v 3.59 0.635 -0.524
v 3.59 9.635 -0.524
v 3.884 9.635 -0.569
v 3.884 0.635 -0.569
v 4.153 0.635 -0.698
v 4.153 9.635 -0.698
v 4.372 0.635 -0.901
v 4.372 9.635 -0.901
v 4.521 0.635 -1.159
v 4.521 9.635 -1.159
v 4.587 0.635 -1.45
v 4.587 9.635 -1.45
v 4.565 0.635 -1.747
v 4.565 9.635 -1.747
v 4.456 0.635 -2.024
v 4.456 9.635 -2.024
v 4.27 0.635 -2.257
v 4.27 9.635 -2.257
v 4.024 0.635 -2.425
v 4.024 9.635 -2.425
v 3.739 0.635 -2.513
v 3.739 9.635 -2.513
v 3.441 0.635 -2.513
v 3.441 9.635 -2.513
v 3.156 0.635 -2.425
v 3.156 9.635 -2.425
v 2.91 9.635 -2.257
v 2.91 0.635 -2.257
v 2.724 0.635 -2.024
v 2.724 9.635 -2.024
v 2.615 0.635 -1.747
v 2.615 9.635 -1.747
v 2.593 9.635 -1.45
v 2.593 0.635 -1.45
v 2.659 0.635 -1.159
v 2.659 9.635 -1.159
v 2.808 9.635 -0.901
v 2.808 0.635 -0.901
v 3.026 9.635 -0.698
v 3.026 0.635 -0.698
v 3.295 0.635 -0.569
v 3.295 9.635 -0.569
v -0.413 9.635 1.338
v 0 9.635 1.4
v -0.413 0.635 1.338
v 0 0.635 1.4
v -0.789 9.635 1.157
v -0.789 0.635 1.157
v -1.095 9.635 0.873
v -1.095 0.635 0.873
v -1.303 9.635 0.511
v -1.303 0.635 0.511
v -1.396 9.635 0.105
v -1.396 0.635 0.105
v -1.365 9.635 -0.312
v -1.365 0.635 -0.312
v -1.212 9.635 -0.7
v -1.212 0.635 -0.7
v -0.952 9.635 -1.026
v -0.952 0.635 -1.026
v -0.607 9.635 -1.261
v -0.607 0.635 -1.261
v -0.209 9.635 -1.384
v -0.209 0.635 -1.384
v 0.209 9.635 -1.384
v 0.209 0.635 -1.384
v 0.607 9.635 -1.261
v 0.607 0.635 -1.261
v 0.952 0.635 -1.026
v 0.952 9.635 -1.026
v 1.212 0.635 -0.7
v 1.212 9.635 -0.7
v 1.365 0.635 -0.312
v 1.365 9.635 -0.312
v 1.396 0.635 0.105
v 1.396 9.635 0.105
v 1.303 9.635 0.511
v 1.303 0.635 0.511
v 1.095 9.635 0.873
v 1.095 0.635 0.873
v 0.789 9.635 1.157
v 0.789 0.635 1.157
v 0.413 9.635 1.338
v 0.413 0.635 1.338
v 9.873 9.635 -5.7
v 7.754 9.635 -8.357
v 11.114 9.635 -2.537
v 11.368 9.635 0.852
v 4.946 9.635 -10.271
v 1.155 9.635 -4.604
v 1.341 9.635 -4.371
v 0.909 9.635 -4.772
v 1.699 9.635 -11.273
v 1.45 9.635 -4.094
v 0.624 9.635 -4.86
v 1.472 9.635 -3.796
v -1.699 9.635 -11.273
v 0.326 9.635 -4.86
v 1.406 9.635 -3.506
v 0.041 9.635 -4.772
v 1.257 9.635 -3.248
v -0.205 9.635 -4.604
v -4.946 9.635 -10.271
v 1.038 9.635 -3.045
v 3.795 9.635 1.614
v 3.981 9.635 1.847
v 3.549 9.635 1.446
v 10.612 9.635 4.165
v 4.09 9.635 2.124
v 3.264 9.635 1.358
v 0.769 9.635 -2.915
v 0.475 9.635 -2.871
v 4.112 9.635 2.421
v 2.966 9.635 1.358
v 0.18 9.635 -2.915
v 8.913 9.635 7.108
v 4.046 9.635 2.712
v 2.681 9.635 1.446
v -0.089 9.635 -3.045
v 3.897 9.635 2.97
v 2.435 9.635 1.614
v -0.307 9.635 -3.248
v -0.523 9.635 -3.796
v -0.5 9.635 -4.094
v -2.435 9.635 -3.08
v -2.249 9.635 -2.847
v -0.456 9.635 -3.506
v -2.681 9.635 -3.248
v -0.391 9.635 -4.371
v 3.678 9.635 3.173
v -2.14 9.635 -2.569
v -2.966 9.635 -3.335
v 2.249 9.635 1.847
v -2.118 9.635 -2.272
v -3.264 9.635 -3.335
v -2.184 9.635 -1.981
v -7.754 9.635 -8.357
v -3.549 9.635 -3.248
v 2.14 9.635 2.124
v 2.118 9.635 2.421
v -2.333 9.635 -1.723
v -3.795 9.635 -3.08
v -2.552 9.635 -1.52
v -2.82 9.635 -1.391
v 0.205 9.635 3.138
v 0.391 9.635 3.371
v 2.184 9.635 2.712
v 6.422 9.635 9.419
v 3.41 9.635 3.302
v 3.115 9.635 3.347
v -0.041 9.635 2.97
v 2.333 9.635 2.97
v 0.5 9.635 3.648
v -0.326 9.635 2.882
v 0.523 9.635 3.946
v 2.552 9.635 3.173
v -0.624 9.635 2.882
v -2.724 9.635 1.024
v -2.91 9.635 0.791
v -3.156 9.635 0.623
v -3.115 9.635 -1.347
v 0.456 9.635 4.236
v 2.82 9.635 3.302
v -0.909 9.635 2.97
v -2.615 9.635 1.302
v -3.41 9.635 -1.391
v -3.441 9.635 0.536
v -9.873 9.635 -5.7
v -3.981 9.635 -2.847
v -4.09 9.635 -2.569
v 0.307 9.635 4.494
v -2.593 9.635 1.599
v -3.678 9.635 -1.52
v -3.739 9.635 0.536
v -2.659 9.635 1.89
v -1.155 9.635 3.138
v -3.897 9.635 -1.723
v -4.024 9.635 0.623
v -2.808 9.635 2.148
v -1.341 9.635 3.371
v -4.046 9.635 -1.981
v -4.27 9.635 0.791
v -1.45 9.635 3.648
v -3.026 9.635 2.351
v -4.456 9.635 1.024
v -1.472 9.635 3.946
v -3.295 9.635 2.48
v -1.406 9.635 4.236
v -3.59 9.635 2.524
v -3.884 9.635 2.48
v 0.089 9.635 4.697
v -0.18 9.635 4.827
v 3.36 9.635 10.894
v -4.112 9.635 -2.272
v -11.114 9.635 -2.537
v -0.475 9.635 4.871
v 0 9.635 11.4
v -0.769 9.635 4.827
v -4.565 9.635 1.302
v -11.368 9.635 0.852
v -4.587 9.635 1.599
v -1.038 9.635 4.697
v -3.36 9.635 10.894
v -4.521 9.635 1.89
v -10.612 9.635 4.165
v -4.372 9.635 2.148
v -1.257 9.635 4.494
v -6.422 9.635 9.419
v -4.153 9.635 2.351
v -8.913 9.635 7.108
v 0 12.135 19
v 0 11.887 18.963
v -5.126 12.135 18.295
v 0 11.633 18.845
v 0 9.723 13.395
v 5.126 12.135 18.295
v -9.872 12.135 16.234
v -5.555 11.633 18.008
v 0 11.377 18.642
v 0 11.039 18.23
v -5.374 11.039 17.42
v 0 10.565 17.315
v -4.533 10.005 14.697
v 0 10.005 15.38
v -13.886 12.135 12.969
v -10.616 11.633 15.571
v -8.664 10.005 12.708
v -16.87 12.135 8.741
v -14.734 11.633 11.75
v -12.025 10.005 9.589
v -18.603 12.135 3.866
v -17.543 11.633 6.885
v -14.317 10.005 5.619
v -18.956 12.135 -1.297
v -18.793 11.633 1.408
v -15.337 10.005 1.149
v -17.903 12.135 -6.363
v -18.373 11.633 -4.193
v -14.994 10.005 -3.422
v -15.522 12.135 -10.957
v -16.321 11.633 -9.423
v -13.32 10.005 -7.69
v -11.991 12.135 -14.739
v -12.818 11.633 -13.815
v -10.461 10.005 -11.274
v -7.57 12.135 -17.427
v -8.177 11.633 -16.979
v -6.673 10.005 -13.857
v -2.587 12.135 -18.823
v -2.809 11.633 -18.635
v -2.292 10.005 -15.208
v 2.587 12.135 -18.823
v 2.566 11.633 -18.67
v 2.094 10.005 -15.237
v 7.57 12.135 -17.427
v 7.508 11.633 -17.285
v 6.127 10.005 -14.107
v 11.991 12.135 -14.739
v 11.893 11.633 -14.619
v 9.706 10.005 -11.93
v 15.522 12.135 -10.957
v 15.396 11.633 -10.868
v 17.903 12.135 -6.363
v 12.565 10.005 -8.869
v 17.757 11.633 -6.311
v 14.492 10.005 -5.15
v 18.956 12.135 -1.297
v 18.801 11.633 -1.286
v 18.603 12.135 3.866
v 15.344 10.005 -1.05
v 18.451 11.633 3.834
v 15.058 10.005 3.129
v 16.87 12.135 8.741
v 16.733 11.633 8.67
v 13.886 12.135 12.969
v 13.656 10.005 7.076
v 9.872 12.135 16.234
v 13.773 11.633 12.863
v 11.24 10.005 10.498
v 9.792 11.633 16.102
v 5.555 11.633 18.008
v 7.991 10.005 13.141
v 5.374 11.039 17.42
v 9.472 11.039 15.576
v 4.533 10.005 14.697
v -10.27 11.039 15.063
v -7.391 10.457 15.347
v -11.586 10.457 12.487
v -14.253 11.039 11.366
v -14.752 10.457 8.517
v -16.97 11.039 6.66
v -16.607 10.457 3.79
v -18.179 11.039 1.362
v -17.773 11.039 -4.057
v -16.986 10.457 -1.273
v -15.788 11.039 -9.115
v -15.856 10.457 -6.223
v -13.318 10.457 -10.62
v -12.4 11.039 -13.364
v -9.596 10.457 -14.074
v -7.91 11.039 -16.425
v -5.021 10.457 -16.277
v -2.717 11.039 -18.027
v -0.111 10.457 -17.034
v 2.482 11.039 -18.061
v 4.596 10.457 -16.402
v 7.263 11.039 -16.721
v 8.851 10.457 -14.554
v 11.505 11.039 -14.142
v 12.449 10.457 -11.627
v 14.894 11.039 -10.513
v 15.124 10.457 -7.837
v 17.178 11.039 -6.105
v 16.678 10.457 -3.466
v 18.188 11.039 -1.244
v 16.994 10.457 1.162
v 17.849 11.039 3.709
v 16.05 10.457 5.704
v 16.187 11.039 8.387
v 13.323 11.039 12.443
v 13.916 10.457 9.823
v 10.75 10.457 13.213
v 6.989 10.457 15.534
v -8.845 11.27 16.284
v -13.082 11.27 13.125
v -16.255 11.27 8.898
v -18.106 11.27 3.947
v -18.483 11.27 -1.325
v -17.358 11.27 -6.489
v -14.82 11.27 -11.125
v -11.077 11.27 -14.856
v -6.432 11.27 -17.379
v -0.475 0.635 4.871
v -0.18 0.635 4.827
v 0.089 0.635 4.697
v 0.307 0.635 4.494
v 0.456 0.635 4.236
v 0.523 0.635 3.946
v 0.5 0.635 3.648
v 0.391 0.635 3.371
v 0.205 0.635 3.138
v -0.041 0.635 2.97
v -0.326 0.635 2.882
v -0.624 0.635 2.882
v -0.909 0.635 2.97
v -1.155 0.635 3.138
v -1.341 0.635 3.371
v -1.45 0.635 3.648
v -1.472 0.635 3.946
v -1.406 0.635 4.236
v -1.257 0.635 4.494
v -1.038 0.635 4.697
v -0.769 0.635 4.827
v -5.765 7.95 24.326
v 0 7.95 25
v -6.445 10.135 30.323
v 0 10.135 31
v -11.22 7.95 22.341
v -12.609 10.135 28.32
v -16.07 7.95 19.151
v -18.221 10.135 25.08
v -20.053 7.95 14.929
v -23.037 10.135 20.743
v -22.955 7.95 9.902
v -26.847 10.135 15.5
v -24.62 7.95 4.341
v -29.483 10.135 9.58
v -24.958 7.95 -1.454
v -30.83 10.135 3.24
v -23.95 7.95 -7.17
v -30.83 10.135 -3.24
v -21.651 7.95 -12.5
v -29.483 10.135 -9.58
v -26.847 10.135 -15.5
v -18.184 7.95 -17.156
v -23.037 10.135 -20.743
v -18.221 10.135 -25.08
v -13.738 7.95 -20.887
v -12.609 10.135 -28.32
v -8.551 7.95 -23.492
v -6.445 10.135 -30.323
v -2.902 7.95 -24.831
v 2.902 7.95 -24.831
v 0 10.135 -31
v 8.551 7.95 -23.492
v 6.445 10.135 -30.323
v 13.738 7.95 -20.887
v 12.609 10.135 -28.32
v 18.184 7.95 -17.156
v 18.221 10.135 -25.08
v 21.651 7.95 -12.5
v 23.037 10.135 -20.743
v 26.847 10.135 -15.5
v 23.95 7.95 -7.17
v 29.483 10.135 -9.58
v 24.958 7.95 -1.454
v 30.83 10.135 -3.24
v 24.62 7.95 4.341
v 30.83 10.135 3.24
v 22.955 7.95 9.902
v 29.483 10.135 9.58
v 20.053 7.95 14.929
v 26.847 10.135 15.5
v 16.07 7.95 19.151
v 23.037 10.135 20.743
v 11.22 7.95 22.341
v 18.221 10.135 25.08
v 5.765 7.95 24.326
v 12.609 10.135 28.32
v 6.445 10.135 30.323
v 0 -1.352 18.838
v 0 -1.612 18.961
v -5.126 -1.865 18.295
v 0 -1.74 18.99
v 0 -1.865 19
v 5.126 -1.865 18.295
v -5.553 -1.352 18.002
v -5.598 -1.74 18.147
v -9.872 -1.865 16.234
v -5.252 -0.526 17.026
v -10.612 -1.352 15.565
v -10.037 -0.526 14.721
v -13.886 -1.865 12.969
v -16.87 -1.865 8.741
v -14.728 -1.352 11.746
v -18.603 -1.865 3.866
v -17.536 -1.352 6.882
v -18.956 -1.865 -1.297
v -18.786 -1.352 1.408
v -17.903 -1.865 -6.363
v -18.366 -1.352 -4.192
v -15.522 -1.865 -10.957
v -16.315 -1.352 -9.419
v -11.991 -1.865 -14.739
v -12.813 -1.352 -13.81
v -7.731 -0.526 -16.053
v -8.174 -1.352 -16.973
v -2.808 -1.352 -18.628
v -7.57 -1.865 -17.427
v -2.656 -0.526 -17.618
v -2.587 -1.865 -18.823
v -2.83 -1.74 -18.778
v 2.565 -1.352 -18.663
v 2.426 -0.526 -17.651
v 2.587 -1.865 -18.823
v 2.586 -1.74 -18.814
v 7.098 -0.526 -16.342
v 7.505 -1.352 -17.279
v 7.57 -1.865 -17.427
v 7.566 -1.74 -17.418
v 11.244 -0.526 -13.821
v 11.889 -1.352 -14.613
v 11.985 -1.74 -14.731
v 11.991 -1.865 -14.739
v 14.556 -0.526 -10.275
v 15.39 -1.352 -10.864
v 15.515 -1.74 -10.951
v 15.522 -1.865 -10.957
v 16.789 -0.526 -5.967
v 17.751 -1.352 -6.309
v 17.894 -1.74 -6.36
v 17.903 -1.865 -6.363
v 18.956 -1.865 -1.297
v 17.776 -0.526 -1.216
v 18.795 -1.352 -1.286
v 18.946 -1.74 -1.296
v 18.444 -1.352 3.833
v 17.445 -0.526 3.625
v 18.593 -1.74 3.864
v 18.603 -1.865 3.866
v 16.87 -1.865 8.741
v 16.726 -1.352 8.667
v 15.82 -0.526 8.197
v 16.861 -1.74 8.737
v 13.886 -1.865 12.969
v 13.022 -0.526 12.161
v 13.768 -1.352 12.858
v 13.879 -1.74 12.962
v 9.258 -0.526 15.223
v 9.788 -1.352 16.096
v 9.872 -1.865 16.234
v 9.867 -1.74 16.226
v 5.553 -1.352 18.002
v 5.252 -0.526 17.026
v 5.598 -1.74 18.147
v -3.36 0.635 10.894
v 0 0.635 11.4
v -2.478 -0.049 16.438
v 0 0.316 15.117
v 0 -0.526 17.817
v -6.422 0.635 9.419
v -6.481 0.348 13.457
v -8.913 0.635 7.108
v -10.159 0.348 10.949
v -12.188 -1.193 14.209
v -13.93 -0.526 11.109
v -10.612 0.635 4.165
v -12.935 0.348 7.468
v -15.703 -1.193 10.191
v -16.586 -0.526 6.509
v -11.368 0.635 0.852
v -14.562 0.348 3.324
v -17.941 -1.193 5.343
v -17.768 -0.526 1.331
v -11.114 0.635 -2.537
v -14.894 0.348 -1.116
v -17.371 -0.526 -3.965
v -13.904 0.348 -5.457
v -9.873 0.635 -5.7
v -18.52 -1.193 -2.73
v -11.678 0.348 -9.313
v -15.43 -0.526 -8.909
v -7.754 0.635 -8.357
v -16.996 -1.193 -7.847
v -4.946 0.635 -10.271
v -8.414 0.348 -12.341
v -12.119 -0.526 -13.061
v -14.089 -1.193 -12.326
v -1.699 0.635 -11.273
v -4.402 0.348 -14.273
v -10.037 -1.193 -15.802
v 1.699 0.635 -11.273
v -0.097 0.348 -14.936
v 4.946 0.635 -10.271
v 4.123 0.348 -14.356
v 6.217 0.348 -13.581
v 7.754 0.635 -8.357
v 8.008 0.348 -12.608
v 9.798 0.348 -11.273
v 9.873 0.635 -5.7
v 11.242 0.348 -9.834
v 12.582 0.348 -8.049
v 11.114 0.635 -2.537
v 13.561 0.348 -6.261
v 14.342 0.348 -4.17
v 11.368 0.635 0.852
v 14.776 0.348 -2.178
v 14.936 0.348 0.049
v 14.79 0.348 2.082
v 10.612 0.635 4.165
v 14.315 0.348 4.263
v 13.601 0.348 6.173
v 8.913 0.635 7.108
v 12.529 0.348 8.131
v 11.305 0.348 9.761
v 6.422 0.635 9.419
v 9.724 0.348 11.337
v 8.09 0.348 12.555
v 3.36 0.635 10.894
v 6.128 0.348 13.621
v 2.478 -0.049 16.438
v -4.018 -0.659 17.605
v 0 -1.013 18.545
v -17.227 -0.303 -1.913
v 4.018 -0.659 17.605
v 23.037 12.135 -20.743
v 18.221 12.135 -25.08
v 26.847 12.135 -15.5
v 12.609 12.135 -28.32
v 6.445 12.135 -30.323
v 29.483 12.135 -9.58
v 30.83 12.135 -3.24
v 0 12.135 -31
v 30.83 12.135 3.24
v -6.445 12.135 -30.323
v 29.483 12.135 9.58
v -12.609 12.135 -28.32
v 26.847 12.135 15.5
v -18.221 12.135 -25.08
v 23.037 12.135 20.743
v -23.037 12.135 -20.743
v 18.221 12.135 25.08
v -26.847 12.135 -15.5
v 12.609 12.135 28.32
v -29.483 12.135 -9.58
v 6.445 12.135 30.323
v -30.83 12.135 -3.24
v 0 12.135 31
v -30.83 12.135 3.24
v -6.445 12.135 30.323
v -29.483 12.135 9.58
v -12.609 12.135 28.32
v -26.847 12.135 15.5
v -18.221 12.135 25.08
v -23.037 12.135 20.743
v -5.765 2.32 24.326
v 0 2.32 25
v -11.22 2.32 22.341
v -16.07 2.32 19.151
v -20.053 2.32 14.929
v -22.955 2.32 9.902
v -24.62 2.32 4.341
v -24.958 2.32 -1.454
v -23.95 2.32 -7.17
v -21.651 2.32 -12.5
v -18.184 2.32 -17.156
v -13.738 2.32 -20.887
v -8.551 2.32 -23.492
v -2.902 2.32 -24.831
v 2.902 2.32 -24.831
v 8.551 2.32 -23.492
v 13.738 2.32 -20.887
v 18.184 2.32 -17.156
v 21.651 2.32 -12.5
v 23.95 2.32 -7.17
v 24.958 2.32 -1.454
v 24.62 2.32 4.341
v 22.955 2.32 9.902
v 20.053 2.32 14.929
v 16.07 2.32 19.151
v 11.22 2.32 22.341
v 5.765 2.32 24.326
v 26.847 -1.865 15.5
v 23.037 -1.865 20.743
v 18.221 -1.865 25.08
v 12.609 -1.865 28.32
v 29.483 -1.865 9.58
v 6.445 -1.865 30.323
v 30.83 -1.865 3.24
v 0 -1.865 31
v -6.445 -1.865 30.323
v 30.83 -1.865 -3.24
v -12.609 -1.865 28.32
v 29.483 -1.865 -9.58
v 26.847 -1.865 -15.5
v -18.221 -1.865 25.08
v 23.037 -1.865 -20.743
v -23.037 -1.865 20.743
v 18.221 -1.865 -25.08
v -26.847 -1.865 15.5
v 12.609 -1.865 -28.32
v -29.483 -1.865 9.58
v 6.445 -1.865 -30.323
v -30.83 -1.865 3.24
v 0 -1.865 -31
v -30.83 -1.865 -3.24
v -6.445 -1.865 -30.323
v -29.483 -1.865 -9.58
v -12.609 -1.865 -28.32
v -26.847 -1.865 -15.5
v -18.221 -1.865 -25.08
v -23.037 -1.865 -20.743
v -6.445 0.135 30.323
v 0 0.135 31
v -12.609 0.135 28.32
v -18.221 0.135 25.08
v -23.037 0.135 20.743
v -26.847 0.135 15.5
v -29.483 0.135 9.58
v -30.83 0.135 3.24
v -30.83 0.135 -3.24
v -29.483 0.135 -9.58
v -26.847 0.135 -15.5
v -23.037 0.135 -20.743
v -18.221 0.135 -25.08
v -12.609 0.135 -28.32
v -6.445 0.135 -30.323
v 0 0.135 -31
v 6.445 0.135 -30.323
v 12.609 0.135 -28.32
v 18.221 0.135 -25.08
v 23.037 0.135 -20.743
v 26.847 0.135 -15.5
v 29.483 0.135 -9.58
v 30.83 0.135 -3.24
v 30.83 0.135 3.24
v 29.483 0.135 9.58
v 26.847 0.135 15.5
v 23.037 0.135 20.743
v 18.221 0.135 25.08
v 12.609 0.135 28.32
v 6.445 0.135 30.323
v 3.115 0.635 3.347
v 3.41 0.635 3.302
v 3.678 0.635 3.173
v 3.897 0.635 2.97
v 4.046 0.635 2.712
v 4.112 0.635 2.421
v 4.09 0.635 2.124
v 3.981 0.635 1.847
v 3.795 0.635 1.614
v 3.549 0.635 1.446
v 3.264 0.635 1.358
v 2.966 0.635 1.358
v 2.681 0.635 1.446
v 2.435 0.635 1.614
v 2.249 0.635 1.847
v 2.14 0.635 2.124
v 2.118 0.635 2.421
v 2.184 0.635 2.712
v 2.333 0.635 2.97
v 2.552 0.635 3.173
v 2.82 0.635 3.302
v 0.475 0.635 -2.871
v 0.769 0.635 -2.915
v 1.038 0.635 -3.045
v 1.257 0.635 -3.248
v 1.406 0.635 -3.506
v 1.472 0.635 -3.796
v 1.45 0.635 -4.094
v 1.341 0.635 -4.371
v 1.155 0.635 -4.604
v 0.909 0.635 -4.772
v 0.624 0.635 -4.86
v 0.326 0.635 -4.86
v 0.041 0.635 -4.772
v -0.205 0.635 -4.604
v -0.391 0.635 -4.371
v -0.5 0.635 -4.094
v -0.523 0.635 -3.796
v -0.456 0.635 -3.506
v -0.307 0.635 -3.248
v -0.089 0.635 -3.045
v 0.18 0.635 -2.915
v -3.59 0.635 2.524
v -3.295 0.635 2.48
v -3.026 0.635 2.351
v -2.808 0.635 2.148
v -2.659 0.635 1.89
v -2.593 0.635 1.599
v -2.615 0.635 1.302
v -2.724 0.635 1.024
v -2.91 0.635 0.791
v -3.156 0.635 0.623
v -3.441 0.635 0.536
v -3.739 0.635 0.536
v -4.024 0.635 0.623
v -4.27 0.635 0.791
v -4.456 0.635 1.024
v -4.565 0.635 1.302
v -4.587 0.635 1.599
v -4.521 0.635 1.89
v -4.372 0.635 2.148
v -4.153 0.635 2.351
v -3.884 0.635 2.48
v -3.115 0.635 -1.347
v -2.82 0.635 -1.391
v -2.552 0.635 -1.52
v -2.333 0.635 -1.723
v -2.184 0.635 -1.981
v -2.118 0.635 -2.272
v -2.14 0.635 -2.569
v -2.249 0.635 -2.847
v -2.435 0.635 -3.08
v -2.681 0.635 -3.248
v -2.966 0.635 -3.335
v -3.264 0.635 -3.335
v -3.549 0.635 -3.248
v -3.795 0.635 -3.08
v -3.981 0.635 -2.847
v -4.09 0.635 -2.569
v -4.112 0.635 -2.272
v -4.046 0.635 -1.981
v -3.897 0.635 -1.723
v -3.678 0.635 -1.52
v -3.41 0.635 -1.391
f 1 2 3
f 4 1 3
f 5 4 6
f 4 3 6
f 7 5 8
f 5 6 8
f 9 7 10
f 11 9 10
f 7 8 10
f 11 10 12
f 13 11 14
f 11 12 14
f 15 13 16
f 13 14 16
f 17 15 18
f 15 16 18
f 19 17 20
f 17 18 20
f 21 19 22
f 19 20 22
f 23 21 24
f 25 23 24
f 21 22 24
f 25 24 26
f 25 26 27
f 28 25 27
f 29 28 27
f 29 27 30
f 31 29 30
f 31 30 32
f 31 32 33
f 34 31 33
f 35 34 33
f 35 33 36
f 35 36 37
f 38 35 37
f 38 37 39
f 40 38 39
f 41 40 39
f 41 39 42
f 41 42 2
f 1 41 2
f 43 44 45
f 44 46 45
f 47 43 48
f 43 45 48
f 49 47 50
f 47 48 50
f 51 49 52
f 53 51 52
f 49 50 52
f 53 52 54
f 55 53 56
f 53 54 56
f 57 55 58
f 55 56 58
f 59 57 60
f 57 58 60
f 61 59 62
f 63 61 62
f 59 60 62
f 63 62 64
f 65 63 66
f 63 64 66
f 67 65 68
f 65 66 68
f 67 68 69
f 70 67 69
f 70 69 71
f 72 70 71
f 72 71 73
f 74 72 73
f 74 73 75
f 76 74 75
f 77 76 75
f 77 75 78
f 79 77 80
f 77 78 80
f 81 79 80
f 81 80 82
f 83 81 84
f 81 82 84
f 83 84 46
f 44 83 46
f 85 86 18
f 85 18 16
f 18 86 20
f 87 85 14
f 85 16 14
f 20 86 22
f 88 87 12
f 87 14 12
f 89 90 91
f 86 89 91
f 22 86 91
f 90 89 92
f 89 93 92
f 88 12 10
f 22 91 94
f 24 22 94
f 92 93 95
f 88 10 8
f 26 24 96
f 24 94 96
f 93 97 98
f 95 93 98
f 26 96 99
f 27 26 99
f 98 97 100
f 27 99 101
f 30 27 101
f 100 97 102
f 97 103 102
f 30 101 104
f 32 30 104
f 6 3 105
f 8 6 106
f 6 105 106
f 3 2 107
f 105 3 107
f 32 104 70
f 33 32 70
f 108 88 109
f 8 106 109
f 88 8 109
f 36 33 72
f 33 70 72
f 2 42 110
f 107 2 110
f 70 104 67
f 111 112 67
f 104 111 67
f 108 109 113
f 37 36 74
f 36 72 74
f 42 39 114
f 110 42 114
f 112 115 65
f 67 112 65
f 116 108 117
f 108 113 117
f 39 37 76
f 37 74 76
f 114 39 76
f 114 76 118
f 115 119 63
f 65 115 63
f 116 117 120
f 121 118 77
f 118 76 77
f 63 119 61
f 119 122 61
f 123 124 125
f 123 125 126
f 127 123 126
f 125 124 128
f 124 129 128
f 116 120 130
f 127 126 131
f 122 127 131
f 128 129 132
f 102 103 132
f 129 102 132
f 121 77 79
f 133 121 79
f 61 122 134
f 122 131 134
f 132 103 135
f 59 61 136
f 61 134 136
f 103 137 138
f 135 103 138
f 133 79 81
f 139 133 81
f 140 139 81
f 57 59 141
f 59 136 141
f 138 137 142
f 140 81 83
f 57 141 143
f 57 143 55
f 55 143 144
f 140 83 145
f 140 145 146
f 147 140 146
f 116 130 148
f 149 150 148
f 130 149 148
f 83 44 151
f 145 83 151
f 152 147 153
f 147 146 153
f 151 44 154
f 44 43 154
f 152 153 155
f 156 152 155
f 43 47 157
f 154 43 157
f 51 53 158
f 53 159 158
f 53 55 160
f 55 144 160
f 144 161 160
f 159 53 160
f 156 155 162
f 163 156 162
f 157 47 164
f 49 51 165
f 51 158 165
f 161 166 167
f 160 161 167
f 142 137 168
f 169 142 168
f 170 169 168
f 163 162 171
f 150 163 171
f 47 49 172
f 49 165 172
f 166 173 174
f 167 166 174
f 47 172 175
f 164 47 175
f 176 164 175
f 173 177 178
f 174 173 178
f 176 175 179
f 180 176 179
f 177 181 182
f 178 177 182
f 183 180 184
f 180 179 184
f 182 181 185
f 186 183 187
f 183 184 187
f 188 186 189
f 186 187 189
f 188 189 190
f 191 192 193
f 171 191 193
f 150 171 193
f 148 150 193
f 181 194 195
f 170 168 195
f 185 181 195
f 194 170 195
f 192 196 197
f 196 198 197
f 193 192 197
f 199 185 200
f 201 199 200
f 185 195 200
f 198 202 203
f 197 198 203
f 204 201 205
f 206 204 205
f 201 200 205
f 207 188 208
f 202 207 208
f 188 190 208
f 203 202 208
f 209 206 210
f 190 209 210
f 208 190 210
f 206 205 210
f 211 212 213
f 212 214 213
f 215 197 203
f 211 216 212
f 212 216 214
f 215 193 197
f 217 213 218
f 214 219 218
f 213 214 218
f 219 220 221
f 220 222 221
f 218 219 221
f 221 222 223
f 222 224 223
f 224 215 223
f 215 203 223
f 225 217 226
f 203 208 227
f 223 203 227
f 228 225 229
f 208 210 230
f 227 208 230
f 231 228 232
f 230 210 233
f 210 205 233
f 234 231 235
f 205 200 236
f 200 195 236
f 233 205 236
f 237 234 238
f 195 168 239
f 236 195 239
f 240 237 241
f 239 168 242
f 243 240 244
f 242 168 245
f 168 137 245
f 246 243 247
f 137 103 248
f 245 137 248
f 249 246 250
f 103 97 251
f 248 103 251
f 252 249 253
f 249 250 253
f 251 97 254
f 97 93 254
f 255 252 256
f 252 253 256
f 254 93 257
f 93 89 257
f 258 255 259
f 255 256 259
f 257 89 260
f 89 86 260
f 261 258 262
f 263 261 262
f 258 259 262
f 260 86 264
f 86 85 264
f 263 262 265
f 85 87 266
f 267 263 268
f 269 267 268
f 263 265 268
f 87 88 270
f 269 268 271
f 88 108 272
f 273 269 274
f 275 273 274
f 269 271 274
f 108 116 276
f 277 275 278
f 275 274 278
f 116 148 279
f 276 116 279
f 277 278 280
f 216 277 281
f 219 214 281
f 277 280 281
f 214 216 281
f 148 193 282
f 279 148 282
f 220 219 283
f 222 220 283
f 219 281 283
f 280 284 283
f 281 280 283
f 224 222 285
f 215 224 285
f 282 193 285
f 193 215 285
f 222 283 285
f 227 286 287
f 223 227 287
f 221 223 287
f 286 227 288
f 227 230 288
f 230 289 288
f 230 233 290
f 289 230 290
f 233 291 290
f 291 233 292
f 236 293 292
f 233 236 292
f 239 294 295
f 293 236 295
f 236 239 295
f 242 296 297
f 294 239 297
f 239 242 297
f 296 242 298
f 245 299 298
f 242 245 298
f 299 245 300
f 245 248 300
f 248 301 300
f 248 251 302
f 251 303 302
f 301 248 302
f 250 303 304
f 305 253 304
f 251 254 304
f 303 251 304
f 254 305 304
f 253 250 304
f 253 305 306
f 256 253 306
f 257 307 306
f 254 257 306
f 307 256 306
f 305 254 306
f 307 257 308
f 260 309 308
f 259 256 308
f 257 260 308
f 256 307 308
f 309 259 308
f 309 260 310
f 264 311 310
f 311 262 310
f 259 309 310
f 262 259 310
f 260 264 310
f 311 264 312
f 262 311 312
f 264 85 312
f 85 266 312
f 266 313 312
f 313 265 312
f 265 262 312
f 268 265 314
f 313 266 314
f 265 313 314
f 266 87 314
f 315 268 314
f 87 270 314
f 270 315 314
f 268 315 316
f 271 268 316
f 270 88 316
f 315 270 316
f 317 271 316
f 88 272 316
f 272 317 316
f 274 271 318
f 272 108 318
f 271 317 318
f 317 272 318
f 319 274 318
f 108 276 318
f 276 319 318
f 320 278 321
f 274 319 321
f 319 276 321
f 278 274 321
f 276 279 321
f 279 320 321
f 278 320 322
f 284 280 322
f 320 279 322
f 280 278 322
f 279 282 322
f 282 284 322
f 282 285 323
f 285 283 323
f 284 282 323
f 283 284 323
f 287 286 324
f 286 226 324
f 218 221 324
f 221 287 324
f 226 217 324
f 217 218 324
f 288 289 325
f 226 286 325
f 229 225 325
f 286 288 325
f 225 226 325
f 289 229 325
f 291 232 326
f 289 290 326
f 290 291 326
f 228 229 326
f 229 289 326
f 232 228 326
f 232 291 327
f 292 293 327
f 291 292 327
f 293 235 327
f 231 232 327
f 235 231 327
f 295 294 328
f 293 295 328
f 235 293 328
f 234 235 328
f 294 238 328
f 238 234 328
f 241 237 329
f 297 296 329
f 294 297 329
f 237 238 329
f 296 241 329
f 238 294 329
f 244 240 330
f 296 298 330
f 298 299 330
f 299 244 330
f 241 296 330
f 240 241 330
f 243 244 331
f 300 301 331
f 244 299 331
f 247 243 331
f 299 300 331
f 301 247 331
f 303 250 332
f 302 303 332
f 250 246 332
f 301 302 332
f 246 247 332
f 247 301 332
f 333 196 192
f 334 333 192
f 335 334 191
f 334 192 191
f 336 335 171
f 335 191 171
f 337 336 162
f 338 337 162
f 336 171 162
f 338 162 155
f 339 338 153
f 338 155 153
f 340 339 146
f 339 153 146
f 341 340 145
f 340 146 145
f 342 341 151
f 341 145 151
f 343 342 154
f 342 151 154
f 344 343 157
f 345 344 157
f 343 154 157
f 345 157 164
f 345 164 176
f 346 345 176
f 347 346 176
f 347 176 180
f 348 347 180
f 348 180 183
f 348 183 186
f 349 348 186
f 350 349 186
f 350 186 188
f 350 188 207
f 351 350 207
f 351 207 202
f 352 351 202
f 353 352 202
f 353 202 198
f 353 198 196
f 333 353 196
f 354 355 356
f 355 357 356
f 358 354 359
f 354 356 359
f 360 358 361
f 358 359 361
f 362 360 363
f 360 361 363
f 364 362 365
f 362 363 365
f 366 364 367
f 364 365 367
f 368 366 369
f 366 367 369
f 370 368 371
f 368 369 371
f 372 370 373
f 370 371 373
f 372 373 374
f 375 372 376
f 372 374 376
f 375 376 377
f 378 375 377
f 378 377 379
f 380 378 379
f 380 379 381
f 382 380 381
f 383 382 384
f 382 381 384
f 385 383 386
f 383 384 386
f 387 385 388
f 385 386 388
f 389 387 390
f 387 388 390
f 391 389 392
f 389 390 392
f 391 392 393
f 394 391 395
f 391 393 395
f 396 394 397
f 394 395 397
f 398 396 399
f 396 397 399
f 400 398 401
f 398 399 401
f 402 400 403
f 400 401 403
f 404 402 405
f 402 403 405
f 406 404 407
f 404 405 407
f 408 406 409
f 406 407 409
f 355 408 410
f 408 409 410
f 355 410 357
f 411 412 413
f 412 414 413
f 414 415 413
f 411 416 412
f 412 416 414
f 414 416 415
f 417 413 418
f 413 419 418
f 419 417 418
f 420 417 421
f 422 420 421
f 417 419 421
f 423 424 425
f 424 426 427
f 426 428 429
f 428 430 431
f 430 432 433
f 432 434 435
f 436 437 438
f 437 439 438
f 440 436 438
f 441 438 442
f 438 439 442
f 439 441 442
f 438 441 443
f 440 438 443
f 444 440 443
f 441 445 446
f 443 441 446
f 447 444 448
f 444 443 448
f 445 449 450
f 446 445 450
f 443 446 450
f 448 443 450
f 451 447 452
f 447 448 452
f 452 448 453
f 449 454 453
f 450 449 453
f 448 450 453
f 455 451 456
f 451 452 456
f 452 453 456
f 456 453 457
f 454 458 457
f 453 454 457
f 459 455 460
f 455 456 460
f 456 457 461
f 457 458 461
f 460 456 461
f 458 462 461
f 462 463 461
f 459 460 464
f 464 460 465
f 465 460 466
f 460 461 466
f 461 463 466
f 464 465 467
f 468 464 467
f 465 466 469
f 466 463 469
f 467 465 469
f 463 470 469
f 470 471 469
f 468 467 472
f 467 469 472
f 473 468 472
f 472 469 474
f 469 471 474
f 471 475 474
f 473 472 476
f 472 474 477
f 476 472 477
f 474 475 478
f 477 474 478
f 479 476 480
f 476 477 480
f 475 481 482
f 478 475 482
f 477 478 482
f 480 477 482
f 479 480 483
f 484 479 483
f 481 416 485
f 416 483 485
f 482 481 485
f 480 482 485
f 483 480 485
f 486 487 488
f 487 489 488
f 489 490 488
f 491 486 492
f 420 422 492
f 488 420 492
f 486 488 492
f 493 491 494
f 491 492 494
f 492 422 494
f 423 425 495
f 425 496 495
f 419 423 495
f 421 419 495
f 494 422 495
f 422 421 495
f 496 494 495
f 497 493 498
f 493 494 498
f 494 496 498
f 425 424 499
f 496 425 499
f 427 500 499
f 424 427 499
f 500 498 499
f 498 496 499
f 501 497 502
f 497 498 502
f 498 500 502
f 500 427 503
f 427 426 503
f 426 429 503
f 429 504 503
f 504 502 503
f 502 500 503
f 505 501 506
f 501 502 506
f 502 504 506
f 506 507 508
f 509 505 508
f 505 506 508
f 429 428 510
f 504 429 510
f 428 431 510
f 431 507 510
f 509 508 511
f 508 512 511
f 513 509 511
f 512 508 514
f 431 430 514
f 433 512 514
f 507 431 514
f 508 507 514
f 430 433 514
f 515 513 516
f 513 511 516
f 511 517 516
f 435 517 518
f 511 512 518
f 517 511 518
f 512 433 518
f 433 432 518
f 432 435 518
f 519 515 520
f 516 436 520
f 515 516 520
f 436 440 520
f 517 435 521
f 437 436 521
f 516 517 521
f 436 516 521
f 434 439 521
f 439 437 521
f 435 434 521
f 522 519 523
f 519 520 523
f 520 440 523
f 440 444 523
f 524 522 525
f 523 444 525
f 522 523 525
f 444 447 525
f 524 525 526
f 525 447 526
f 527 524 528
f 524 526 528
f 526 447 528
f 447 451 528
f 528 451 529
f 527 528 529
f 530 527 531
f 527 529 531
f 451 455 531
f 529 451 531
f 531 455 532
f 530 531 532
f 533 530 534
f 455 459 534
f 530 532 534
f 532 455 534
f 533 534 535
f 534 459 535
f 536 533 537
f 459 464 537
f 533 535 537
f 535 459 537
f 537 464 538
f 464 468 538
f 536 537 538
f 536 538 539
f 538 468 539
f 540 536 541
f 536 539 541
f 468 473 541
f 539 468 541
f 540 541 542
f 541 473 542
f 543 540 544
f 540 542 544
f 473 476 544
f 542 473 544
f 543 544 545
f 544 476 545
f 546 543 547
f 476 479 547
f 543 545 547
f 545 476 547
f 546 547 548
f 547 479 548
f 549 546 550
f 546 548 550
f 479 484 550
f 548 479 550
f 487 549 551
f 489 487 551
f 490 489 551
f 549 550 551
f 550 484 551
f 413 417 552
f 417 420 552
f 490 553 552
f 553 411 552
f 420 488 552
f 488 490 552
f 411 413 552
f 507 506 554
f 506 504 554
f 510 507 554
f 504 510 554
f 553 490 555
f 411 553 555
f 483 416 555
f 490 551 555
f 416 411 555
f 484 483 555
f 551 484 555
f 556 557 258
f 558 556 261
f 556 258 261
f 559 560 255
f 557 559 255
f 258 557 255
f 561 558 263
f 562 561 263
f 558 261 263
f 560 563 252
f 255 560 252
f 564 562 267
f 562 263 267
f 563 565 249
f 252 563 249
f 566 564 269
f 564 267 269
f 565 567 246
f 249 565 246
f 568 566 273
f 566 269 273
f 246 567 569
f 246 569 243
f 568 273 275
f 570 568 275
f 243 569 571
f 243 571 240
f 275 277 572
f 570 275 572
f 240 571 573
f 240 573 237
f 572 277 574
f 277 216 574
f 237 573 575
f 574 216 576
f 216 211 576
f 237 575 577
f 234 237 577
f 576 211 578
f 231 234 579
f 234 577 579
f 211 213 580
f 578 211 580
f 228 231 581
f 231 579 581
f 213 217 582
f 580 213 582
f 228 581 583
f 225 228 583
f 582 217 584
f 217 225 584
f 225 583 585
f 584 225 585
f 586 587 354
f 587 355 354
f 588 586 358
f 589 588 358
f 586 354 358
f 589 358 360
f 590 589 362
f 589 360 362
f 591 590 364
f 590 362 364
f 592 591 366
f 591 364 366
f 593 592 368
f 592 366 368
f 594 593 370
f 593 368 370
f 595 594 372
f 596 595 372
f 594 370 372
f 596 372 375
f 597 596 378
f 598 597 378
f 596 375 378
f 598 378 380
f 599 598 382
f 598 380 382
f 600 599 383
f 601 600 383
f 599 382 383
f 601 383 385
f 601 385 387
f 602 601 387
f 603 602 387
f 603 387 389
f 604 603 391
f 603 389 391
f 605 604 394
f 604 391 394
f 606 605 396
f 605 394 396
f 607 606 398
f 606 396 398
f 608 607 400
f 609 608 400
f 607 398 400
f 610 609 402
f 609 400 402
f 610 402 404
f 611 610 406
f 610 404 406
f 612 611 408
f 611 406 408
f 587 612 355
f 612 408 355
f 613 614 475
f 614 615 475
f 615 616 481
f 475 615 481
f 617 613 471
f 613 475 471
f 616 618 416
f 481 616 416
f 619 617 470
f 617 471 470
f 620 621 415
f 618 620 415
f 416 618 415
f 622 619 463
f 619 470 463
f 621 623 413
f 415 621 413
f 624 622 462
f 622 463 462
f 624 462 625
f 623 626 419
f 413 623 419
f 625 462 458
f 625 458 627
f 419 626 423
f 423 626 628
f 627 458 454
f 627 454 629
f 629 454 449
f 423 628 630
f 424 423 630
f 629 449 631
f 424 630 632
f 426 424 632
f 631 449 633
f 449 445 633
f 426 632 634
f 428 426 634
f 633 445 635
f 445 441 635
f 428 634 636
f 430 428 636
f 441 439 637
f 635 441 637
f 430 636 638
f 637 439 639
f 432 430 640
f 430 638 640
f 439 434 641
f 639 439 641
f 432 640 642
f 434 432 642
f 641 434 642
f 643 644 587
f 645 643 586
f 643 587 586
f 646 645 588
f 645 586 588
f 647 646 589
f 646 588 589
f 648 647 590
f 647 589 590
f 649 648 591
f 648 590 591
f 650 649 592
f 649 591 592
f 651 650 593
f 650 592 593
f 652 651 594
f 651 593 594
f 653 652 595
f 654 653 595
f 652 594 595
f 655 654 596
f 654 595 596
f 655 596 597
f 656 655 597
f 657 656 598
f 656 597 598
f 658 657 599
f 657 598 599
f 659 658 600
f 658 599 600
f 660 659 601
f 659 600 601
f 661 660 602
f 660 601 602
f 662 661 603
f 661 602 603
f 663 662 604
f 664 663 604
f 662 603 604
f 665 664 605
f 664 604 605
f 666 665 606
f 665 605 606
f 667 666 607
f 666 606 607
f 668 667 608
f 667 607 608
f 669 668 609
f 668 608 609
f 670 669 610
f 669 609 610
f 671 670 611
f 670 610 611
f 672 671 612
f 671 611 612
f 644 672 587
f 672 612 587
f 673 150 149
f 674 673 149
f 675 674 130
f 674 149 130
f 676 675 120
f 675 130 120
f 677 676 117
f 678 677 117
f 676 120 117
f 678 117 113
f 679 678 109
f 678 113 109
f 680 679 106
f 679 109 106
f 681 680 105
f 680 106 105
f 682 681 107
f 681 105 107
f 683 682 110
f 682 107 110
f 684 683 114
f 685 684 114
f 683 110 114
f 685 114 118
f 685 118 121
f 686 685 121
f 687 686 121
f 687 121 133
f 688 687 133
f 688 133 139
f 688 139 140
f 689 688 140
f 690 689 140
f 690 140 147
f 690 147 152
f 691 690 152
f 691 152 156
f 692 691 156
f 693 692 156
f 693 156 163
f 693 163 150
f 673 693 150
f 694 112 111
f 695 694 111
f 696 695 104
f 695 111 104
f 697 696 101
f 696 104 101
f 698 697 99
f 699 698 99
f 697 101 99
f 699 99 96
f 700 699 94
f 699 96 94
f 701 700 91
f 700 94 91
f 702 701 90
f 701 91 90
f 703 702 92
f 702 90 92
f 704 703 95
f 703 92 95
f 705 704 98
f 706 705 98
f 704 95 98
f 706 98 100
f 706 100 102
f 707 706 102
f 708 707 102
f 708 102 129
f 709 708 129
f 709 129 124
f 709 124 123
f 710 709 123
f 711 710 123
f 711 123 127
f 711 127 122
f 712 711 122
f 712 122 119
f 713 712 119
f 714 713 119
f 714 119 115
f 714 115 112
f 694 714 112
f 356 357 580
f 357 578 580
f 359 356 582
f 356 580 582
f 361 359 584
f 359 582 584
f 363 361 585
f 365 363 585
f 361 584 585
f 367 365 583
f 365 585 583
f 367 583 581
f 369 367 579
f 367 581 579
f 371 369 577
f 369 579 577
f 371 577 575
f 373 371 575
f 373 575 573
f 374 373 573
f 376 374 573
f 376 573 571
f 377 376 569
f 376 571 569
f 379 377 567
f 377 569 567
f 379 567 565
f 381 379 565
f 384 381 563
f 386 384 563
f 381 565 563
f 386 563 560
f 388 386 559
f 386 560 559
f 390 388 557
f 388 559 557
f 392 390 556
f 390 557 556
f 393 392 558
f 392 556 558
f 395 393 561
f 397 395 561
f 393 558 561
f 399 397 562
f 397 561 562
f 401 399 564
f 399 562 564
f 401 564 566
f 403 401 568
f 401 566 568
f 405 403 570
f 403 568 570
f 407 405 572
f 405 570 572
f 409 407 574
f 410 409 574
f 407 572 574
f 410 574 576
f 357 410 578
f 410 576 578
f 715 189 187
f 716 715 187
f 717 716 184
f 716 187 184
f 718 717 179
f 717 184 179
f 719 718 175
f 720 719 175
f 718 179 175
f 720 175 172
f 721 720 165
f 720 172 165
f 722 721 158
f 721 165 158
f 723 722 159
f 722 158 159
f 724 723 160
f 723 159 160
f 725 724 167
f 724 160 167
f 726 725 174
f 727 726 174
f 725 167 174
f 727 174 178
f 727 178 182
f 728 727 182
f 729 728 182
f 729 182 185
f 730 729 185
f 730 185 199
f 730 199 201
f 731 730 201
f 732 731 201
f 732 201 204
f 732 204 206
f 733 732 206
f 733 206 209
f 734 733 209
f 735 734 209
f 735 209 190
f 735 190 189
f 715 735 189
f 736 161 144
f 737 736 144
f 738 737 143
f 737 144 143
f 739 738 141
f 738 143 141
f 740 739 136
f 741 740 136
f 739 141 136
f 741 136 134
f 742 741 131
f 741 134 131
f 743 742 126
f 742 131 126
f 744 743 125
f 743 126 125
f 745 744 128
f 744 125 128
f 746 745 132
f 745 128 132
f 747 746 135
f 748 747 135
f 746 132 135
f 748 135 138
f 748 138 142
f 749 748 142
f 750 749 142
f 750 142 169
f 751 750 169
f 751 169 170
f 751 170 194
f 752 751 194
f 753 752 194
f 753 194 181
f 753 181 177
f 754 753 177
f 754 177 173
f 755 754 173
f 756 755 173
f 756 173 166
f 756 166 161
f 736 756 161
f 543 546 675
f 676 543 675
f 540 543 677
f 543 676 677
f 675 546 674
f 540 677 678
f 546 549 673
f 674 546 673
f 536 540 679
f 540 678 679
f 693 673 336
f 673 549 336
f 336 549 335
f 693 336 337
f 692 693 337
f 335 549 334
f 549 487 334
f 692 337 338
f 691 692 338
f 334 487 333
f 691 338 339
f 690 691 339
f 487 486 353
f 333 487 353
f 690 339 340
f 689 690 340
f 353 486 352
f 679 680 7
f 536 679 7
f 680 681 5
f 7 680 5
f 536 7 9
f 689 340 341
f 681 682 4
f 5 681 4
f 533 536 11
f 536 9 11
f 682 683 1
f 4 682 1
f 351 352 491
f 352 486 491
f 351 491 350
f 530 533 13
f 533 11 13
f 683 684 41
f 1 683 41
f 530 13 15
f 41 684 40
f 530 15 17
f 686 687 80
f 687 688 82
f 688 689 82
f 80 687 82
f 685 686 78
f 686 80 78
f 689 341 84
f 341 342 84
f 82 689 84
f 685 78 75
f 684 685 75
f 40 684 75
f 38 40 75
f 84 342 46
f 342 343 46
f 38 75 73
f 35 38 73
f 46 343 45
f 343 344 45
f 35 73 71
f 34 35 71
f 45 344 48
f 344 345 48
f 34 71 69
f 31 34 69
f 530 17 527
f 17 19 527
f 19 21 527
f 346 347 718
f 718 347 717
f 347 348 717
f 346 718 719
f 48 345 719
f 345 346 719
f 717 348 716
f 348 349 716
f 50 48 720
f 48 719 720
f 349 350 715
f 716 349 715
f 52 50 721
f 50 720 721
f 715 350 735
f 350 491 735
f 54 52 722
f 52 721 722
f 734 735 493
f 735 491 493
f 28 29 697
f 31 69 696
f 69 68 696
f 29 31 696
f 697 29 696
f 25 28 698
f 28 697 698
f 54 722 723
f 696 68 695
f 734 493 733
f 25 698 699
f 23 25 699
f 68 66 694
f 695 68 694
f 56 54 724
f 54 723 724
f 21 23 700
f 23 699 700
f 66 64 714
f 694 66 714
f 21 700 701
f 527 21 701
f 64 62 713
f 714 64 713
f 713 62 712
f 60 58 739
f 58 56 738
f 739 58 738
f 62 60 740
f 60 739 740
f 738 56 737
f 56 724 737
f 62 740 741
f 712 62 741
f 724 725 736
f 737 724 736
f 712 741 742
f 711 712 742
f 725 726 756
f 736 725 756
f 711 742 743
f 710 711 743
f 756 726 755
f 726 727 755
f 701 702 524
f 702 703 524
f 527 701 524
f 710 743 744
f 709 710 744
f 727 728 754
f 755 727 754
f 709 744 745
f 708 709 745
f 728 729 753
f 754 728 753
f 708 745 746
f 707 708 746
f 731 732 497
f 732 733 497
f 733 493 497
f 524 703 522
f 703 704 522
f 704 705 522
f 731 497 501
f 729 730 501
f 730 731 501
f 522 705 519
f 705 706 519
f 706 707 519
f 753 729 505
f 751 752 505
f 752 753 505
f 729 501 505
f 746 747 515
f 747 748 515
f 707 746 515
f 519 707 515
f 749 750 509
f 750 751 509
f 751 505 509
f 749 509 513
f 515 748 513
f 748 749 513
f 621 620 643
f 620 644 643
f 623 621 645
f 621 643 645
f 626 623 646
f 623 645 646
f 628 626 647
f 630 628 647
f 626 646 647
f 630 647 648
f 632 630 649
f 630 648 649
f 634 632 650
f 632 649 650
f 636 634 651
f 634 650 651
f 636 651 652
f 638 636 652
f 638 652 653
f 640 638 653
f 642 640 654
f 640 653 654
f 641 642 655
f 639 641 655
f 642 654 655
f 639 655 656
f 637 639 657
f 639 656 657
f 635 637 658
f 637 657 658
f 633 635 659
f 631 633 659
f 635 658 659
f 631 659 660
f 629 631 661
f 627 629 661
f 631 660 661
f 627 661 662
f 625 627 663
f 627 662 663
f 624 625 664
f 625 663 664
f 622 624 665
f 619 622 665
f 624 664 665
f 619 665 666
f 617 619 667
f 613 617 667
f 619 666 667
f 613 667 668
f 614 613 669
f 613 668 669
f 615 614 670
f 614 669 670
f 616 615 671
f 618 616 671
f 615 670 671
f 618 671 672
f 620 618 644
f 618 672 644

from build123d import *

# Parameters (mm, degrees)
SKETCH3_R          = 1
CUT_EXTRUDE1_DEPTH = 10


with BuildPart() as part:
    # Sketch2 → Revolve1 (revolve)
    with BuildSketch(Plane.XY, mode=Mode.PRIVATE) as revolve1_sk:
        with BuildLine():
            Line((-1.4, 9.635032461), (-1.4, 0.635032461))
            Line((-1.4, 0.635032461), (-11.4, 0.635032461))
            add(Edge.make_bspline(
                [(-11.4, 0.635032461), (-19, 0.635032461), (-19, -1.864967539)],
                knots=[4.71238898, 4.71238898, 4.71238898, 6.283185307, 6.283185307, 6.283185307], degree=2, weights=[1, 0.707106781, 1]))
            Line((-19, -1.864967539), (-31, -1.864967539))
            Line((-31, -1.864967539), (-31, 0.135032461))
            Line((-31, 0.135032461), (-25, 2.320032461))
            Line((-25, 2.320032461), (-25, 7.950032461))
            Line((-25, 7.950032461), (-31, 10.135032461))
            Line((-31, 10.135032461), (-31, 12.135032461))
            Line((-31, 12.135032461), (-19, 12.135032461))
            add(Edge.make_bspline(
                [(-19, 12.135032461), (-19, 9.635032461), (-11.4, 9.635032461)],
                knots=[0, 0, 0, 1.570796327, 1.570796327, 1.570796327], degree=2, weights=[1, 0.707106781, 1]))
            Line((-11.4, 9.635032461), (-1.4, 9.635032461))
        make_face()
    revolve(revolve1_sk.sketch.rotate(Axis((0, 6.223604304, 0), (0, -1, 0)), 270), axis=Axis((0, 6.223604304, 0), (0, -1, 0)))

    # Sketch3 → Cut-Extrude1 (cut)
    with BuildSketch(Plane(origin=(0, 9.635032461, 0), x_dir=(1, 0, 0), z_dir=(0, 1, 0))):
        with Locations(Location((-3.115047488, 2.346588832, 0), (0, 0, 270))):
            Circle(SKETCH3_R)
        with Locations(Location((0.474681797, 3.871004675, 0), (0, 0, 270))):
            Circle(SKETCH3_R)
        with Locations(Location((3.589729285, 1.524415842, 0), (0, 0, 270))):
            Circle(SKETCH3_R)
        with Locations(Location((3.115047488, -2.346588832, 0), (0, 0, 270))):
            Circle(SKETCH3_R)
        with Locations(Location((-0.474681797, -3.871004675, 0), (0, 0, 270))):
            Circle(SKETCH3_R)
        with Locations(Location((-3.589729285, -1.524415842, 0), (0, 0, 270))):
            Circle(SKETCH3_R)
    extrude(amount=-CUT_EXTRUDE1_DEPTH, mode=Mode.SUBTRACT)


solid = part.part
